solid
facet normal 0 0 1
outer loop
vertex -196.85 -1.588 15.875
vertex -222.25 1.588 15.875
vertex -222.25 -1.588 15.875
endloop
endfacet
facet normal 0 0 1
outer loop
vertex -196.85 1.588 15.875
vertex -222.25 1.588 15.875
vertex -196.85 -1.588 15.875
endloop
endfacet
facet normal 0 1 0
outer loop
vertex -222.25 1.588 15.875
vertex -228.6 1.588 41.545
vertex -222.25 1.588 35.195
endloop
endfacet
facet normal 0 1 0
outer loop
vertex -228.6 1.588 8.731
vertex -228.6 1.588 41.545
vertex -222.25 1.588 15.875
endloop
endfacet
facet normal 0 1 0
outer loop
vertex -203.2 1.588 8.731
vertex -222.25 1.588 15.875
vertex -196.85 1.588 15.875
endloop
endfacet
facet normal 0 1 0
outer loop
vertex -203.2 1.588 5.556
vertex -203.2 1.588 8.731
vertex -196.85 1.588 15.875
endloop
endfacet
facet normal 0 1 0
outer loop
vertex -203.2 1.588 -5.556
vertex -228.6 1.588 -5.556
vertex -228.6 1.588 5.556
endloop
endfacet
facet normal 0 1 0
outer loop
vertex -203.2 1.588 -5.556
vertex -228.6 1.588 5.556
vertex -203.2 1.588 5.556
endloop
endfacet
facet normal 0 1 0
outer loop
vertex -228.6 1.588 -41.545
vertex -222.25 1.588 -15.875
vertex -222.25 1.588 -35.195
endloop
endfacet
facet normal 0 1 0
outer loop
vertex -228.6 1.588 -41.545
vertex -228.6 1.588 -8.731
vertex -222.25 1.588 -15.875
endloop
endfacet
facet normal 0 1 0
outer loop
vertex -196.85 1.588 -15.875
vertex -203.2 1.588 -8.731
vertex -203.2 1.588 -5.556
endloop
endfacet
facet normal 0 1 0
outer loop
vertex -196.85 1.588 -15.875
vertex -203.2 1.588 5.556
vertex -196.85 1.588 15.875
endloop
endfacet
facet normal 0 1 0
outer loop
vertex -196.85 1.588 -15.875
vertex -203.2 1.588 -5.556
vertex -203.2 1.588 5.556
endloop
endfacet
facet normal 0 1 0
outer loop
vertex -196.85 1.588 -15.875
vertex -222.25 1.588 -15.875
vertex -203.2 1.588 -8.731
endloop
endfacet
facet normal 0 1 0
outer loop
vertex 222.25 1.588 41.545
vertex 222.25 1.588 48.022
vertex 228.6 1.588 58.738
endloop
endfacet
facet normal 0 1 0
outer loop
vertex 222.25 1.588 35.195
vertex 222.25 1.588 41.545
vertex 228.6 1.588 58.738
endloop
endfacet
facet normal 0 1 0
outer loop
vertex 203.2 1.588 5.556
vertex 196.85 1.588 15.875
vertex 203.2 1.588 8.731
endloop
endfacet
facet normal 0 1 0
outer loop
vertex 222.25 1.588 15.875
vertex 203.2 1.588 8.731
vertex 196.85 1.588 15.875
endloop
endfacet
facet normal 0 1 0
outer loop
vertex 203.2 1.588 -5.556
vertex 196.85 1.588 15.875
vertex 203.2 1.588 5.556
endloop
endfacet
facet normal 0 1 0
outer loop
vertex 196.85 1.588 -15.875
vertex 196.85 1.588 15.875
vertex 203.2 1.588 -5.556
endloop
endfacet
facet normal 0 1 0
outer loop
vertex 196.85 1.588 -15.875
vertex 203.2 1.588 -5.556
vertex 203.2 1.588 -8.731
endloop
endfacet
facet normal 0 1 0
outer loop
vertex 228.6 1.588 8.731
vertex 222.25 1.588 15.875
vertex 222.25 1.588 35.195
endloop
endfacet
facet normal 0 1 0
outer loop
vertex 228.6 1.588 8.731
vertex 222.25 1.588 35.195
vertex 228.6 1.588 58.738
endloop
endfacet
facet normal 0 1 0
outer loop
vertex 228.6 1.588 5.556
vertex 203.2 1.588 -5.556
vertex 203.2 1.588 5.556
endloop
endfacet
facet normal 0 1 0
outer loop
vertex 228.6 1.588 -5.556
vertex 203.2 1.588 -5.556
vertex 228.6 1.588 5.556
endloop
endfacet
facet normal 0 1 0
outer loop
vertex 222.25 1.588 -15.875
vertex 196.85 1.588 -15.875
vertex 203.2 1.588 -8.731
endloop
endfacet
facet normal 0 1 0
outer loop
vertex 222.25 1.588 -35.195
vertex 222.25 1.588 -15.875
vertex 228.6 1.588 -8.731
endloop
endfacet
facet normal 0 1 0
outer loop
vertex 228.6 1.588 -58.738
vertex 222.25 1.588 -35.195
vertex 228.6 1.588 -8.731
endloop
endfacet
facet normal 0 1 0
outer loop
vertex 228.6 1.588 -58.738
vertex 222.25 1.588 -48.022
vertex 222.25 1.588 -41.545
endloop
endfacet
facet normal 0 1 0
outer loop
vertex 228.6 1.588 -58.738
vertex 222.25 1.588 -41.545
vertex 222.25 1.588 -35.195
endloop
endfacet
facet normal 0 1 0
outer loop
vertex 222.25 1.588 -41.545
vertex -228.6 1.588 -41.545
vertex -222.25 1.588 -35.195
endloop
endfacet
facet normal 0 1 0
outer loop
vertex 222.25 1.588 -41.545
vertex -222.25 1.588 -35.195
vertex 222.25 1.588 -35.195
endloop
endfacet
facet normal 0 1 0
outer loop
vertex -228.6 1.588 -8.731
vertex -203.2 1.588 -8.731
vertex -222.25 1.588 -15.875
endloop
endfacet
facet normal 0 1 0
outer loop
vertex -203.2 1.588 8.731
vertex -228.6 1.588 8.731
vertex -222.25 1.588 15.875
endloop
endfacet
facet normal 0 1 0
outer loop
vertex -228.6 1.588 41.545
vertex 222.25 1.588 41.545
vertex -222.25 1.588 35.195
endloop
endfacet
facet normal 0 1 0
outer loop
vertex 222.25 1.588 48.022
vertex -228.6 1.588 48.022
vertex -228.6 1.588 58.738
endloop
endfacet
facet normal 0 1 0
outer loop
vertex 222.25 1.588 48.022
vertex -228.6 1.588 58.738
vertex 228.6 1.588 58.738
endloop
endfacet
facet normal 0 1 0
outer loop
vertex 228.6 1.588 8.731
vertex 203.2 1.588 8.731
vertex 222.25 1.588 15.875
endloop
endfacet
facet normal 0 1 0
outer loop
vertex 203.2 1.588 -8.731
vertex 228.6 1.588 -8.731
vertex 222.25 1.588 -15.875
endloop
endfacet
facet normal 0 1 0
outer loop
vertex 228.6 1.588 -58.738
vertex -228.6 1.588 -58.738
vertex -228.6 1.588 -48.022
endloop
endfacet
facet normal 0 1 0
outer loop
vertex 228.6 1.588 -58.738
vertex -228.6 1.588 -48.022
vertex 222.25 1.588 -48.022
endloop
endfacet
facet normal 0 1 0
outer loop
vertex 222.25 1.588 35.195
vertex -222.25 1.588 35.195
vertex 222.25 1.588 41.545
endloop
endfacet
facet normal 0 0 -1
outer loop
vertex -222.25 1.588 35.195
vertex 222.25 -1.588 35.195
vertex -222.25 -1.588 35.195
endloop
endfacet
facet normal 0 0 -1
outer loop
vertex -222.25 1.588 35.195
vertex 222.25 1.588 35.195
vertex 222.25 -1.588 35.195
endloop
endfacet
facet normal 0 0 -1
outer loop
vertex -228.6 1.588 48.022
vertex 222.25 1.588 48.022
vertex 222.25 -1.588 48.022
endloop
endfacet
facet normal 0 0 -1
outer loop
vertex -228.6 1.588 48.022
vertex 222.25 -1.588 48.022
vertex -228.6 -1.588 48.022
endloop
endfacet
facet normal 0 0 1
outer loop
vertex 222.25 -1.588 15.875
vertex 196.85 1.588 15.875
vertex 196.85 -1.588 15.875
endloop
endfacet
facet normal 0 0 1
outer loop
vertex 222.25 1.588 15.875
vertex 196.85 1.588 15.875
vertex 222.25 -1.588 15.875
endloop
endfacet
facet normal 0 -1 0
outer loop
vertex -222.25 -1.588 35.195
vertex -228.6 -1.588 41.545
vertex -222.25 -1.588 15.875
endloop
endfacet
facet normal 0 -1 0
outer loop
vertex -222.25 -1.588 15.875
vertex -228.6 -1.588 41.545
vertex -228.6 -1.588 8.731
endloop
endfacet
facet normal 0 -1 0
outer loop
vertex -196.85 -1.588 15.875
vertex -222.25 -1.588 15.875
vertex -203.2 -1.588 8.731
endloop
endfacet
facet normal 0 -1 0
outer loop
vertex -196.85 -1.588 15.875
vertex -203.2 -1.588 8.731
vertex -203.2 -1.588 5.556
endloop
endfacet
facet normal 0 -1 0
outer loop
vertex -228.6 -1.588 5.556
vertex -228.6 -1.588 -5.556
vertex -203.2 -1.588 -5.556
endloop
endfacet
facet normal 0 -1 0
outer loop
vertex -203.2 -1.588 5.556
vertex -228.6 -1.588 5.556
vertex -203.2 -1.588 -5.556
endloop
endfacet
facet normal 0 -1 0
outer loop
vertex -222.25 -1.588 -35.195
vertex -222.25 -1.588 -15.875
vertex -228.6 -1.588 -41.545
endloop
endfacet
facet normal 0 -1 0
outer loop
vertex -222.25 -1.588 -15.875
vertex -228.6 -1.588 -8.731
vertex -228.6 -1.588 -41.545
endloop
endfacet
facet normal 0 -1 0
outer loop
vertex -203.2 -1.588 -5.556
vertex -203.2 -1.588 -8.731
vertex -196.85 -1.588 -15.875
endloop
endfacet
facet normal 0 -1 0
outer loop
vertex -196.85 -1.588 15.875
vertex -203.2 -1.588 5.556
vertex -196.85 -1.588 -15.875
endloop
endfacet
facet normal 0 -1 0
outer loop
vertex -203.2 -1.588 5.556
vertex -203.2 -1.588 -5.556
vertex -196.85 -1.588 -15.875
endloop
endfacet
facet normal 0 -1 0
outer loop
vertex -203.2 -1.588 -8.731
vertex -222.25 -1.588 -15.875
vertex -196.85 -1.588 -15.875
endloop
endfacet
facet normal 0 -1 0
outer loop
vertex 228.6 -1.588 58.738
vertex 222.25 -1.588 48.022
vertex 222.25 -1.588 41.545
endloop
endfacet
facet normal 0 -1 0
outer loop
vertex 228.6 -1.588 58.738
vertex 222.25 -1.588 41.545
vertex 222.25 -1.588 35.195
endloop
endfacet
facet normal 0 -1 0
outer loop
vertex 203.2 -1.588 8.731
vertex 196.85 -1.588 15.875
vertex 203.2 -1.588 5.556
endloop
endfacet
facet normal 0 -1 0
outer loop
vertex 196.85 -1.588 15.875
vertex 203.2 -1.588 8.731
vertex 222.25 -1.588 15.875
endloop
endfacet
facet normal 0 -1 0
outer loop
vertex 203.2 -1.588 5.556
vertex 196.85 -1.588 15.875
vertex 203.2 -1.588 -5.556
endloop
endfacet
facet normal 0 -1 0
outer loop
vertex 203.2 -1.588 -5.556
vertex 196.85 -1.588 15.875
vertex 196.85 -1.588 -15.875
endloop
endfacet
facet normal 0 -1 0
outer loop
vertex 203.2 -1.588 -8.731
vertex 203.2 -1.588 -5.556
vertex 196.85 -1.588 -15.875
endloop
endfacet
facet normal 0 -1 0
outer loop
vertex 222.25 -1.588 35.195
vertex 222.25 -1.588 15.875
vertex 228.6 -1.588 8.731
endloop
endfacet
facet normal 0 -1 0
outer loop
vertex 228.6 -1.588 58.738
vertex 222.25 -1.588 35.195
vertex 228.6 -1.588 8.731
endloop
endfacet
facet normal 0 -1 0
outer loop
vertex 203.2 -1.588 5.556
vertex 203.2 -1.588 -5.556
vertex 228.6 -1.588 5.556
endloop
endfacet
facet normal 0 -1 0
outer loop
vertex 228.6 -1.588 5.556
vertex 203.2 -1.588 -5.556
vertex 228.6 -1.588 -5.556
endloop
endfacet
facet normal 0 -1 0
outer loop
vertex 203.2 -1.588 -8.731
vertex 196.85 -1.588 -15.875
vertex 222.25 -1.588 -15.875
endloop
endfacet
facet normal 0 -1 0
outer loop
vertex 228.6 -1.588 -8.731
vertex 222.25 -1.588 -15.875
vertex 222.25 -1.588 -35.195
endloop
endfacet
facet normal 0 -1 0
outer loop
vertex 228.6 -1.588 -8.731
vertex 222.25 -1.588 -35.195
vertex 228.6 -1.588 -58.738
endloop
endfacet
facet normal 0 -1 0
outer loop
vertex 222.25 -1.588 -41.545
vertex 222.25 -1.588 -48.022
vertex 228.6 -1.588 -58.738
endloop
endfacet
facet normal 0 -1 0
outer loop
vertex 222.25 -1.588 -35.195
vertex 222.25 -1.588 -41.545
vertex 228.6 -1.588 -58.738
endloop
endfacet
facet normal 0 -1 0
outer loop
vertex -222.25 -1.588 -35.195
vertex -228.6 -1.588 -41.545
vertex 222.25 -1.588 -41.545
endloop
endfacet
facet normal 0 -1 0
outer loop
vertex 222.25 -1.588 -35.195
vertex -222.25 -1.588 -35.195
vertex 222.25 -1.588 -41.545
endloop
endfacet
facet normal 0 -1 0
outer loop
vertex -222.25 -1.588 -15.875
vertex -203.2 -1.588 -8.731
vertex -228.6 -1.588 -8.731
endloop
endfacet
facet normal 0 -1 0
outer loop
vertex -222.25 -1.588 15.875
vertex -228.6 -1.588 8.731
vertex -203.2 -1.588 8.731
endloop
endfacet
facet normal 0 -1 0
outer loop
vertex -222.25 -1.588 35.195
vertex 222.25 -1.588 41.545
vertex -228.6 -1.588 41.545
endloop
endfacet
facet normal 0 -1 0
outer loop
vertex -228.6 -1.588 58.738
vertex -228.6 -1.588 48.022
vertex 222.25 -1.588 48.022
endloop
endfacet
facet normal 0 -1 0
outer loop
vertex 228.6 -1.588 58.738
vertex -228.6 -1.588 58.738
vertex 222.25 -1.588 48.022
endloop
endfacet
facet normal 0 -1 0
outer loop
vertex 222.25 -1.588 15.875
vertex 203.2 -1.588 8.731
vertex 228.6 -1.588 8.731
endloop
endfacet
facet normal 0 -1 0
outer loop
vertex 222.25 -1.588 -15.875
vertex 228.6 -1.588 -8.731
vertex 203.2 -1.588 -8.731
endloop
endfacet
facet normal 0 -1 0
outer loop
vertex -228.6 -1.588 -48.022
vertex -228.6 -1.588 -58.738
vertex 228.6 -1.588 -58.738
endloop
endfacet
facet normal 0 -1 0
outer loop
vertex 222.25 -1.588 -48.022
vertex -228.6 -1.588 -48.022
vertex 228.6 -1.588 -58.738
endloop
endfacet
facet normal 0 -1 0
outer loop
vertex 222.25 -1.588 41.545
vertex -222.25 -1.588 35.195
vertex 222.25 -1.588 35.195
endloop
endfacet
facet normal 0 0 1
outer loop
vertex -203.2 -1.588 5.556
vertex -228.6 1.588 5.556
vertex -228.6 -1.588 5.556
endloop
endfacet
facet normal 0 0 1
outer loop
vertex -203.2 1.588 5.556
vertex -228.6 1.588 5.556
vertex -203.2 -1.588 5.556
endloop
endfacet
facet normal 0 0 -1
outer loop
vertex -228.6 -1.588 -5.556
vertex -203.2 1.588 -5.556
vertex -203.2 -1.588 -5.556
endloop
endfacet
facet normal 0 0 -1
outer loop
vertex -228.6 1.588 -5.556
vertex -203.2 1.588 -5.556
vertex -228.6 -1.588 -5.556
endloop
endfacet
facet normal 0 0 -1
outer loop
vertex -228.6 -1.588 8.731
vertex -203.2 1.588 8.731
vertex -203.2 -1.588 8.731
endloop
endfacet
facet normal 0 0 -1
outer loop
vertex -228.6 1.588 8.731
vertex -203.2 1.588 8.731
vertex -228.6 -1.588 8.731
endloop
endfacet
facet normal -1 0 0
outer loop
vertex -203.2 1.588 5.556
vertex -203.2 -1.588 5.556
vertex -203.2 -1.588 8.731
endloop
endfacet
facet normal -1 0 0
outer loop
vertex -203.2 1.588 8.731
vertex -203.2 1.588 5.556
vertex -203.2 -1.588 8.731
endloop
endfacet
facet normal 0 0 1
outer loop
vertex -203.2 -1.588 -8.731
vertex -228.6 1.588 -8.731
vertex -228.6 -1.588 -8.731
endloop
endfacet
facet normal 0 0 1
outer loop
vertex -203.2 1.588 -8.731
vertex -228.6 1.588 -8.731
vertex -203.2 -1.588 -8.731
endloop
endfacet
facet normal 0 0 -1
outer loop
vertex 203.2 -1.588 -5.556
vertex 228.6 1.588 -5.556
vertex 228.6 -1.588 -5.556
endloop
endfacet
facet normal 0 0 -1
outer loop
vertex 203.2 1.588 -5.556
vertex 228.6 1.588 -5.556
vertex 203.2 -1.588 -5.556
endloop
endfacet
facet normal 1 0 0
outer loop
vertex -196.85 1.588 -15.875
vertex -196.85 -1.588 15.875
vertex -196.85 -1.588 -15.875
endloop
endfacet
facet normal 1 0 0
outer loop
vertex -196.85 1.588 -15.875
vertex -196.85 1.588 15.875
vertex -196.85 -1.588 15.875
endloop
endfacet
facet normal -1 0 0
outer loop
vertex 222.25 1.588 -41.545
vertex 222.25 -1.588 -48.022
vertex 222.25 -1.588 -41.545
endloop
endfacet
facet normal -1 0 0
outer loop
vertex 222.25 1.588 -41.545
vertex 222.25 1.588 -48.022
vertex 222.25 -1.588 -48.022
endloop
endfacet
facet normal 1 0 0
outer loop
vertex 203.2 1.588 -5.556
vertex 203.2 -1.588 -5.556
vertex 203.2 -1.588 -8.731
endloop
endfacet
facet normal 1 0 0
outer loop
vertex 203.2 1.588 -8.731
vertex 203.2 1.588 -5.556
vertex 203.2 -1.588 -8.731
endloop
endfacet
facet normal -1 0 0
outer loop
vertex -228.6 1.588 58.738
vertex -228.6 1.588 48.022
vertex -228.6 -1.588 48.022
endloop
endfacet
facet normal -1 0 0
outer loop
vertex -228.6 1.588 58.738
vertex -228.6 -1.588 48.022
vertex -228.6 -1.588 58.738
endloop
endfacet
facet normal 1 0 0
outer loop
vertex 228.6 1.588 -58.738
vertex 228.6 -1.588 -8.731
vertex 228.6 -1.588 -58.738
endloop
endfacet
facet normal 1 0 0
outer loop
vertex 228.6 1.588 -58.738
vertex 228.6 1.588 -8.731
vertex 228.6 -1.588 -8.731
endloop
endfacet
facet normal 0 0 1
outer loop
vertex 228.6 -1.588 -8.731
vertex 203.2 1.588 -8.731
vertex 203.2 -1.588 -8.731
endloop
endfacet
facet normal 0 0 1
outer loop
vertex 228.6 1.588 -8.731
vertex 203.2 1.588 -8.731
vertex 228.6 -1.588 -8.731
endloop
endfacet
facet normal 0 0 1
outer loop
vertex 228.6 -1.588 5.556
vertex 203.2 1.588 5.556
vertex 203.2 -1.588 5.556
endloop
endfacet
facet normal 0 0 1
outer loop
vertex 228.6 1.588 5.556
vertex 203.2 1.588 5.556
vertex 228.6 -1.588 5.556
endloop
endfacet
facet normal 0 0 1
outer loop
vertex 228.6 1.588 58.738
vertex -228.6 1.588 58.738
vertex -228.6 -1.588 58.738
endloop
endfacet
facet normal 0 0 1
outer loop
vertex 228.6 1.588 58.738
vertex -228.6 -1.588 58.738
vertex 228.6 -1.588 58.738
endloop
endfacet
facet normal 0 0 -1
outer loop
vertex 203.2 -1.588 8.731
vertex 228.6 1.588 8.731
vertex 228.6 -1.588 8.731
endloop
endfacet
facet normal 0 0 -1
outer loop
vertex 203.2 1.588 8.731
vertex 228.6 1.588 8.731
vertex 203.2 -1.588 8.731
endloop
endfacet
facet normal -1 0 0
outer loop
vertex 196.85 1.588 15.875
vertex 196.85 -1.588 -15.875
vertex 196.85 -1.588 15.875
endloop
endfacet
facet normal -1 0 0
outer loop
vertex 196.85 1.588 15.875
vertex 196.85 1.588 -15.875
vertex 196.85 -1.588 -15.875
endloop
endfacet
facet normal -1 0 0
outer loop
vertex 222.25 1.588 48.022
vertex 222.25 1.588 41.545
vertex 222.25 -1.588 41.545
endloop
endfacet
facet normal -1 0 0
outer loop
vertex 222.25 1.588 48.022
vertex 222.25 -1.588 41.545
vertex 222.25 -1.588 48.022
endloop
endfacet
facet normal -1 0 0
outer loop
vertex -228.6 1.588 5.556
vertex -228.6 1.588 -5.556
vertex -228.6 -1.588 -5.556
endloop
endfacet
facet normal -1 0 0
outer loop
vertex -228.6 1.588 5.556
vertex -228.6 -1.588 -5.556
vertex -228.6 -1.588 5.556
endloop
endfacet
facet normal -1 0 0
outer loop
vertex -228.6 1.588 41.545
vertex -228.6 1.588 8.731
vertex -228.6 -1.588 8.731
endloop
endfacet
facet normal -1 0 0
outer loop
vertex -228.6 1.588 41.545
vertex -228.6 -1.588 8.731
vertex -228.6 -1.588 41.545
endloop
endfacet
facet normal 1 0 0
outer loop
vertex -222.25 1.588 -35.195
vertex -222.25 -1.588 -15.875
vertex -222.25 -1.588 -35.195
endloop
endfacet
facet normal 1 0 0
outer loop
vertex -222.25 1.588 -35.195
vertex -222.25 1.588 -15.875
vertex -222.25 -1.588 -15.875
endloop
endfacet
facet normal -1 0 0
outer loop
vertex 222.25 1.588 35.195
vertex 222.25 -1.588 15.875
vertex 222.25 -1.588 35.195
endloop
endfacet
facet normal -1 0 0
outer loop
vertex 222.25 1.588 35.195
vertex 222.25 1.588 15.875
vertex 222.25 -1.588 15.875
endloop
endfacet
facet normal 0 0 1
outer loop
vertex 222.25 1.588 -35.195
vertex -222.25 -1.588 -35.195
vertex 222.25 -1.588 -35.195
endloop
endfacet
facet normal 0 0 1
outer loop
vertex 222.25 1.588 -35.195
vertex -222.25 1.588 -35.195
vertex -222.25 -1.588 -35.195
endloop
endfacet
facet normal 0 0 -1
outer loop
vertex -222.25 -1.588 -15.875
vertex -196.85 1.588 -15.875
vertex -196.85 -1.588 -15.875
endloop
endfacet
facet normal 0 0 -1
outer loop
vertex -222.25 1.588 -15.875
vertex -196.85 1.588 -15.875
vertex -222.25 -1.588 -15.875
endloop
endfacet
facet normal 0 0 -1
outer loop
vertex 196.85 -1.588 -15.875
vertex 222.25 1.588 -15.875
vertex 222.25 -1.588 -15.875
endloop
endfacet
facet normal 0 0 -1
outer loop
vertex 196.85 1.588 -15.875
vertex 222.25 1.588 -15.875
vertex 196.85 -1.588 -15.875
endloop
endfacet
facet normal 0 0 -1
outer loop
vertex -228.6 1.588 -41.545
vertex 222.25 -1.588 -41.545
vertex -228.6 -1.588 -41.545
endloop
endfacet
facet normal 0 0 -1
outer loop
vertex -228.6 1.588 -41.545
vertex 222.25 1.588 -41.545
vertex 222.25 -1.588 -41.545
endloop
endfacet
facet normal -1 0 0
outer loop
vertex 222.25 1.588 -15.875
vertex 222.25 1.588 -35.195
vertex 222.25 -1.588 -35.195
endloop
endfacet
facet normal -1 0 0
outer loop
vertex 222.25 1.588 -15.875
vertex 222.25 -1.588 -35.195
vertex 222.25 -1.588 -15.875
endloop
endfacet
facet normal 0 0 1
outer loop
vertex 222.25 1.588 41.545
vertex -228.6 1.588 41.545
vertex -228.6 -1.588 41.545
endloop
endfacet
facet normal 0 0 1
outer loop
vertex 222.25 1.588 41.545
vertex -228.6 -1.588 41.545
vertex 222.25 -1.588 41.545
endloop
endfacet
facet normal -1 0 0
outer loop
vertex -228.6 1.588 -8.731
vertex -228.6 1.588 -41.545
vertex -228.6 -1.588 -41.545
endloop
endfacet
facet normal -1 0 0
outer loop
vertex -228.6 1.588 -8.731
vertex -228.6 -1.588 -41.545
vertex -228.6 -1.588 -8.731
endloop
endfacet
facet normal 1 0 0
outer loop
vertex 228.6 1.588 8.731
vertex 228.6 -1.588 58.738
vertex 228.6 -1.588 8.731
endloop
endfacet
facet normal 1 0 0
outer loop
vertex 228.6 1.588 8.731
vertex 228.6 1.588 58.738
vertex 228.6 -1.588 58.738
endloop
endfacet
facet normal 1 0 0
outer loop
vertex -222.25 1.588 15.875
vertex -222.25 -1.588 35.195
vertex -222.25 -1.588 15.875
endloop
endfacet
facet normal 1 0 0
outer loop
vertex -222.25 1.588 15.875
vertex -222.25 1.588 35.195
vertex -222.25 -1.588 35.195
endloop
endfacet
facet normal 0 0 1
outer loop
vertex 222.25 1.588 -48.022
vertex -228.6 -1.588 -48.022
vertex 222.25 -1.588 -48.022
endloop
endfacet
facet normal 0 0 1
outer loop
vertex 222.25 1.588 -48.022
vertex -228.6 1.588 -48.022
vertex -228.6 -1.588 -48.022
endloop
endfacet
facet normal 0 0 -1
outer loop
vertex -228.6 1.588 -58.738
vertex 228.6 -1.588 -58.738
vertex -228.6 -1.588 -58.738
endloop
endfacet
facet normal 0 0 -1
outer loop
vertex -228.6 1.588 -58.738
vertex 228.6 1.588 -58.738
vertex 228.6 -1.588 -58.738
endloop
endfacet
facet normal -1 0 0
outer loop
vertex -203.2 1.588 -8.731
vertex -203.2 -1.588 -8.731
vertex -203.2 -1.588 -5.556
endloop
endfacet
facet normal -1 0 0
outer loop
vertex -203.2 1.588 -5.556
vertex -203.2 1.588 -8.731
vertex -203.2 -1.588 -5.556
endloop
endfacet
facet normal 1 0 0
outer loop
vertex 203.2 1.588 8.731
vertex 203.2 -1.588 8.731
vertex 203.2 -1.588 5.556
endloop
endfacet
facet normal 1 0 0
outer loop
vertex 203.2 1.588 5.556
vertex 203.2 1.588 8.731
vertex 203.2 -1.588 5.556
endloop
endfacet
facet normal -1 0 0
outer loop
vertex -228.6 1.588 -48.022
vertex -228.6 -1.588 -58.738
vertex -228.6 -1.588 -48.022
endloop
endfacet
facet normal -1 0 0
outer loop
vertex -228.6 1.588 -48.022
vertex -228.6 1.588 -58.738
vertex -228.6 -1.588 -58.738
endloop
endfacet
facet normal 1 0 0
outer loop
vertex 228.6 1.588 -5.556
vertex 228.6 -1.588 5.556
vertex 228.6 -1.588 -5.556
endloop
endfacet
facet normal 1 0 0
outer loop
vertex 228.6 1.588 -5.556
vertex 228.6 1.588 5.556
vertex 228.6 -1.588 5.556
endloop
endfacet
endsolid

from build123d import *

# Parameters (mm, degrees)
BOSS_EXTRUDE1_DEPTH = 1.5875


with BuildPart() as part:
    # Sketch1 → Boss-Extrude1 (new body, symmetric)
    with BuildSketch(Plane(origin=(0, 0, 0), x_dir=(1, 0, 0), z_dir=(0, 1, 0))):
        Polygon((222.25, 41.544875), (-228.6, 41.544875), (-228.6, 8.73125), (-222.25, 8.73125), (-203.2, 8.73125), (-203.2, 5.55625), (-222.25, 5.55625), (-228.6, 5.55625), (-228.6, -5.55625), (-222.25, -5.55625), (-203.2, -5.55625), (-203.2, -8.73125), (-222.25, -8.73125), (-228.6, -8.73125), (-228.6, -41.544875), (222.25, -41.544875), (222.25, -48.021875), (-228.6, -48.021875), (-228.6, -58.7375), (190.5, -58.7375), (228.6, -58.7375), (228.6, -8.73125), (222.25, -8.73125), (203.2, -8.73125), (203.2, -5.55625), (222.25, -5.55625), (228.6, -5.55625), (228.6, 5.55625), (222.25, 5.55625), (203.2, 5.55625), (203.2, 8.73125), (222.25, 8.73125), (228.6, 8.73125), (228.6, 58.7375), (190.5, 58.7375), (-228.6, 58.7375), (-228.6, 48.021875), (222.25, 48.021875), align=None)
        Polygon((222.25, 35.194875), (222.25, 15.875), (196.85, 15.875), (196.85, -15.875), (222.25, -15.875), (222.25, -35.194875), (-222.25, -35.194875), (-222.25, -15.875), (-196.85, -15.875), (-196.85, 15.875), (-222.25, 15.875), (-222.25, 35.194875), align=None, mode=Mode.SUBTRACT)
    extrude(amount=BOSS_EXTRUDE1_DEPTH, both=True)


solid = part.part
